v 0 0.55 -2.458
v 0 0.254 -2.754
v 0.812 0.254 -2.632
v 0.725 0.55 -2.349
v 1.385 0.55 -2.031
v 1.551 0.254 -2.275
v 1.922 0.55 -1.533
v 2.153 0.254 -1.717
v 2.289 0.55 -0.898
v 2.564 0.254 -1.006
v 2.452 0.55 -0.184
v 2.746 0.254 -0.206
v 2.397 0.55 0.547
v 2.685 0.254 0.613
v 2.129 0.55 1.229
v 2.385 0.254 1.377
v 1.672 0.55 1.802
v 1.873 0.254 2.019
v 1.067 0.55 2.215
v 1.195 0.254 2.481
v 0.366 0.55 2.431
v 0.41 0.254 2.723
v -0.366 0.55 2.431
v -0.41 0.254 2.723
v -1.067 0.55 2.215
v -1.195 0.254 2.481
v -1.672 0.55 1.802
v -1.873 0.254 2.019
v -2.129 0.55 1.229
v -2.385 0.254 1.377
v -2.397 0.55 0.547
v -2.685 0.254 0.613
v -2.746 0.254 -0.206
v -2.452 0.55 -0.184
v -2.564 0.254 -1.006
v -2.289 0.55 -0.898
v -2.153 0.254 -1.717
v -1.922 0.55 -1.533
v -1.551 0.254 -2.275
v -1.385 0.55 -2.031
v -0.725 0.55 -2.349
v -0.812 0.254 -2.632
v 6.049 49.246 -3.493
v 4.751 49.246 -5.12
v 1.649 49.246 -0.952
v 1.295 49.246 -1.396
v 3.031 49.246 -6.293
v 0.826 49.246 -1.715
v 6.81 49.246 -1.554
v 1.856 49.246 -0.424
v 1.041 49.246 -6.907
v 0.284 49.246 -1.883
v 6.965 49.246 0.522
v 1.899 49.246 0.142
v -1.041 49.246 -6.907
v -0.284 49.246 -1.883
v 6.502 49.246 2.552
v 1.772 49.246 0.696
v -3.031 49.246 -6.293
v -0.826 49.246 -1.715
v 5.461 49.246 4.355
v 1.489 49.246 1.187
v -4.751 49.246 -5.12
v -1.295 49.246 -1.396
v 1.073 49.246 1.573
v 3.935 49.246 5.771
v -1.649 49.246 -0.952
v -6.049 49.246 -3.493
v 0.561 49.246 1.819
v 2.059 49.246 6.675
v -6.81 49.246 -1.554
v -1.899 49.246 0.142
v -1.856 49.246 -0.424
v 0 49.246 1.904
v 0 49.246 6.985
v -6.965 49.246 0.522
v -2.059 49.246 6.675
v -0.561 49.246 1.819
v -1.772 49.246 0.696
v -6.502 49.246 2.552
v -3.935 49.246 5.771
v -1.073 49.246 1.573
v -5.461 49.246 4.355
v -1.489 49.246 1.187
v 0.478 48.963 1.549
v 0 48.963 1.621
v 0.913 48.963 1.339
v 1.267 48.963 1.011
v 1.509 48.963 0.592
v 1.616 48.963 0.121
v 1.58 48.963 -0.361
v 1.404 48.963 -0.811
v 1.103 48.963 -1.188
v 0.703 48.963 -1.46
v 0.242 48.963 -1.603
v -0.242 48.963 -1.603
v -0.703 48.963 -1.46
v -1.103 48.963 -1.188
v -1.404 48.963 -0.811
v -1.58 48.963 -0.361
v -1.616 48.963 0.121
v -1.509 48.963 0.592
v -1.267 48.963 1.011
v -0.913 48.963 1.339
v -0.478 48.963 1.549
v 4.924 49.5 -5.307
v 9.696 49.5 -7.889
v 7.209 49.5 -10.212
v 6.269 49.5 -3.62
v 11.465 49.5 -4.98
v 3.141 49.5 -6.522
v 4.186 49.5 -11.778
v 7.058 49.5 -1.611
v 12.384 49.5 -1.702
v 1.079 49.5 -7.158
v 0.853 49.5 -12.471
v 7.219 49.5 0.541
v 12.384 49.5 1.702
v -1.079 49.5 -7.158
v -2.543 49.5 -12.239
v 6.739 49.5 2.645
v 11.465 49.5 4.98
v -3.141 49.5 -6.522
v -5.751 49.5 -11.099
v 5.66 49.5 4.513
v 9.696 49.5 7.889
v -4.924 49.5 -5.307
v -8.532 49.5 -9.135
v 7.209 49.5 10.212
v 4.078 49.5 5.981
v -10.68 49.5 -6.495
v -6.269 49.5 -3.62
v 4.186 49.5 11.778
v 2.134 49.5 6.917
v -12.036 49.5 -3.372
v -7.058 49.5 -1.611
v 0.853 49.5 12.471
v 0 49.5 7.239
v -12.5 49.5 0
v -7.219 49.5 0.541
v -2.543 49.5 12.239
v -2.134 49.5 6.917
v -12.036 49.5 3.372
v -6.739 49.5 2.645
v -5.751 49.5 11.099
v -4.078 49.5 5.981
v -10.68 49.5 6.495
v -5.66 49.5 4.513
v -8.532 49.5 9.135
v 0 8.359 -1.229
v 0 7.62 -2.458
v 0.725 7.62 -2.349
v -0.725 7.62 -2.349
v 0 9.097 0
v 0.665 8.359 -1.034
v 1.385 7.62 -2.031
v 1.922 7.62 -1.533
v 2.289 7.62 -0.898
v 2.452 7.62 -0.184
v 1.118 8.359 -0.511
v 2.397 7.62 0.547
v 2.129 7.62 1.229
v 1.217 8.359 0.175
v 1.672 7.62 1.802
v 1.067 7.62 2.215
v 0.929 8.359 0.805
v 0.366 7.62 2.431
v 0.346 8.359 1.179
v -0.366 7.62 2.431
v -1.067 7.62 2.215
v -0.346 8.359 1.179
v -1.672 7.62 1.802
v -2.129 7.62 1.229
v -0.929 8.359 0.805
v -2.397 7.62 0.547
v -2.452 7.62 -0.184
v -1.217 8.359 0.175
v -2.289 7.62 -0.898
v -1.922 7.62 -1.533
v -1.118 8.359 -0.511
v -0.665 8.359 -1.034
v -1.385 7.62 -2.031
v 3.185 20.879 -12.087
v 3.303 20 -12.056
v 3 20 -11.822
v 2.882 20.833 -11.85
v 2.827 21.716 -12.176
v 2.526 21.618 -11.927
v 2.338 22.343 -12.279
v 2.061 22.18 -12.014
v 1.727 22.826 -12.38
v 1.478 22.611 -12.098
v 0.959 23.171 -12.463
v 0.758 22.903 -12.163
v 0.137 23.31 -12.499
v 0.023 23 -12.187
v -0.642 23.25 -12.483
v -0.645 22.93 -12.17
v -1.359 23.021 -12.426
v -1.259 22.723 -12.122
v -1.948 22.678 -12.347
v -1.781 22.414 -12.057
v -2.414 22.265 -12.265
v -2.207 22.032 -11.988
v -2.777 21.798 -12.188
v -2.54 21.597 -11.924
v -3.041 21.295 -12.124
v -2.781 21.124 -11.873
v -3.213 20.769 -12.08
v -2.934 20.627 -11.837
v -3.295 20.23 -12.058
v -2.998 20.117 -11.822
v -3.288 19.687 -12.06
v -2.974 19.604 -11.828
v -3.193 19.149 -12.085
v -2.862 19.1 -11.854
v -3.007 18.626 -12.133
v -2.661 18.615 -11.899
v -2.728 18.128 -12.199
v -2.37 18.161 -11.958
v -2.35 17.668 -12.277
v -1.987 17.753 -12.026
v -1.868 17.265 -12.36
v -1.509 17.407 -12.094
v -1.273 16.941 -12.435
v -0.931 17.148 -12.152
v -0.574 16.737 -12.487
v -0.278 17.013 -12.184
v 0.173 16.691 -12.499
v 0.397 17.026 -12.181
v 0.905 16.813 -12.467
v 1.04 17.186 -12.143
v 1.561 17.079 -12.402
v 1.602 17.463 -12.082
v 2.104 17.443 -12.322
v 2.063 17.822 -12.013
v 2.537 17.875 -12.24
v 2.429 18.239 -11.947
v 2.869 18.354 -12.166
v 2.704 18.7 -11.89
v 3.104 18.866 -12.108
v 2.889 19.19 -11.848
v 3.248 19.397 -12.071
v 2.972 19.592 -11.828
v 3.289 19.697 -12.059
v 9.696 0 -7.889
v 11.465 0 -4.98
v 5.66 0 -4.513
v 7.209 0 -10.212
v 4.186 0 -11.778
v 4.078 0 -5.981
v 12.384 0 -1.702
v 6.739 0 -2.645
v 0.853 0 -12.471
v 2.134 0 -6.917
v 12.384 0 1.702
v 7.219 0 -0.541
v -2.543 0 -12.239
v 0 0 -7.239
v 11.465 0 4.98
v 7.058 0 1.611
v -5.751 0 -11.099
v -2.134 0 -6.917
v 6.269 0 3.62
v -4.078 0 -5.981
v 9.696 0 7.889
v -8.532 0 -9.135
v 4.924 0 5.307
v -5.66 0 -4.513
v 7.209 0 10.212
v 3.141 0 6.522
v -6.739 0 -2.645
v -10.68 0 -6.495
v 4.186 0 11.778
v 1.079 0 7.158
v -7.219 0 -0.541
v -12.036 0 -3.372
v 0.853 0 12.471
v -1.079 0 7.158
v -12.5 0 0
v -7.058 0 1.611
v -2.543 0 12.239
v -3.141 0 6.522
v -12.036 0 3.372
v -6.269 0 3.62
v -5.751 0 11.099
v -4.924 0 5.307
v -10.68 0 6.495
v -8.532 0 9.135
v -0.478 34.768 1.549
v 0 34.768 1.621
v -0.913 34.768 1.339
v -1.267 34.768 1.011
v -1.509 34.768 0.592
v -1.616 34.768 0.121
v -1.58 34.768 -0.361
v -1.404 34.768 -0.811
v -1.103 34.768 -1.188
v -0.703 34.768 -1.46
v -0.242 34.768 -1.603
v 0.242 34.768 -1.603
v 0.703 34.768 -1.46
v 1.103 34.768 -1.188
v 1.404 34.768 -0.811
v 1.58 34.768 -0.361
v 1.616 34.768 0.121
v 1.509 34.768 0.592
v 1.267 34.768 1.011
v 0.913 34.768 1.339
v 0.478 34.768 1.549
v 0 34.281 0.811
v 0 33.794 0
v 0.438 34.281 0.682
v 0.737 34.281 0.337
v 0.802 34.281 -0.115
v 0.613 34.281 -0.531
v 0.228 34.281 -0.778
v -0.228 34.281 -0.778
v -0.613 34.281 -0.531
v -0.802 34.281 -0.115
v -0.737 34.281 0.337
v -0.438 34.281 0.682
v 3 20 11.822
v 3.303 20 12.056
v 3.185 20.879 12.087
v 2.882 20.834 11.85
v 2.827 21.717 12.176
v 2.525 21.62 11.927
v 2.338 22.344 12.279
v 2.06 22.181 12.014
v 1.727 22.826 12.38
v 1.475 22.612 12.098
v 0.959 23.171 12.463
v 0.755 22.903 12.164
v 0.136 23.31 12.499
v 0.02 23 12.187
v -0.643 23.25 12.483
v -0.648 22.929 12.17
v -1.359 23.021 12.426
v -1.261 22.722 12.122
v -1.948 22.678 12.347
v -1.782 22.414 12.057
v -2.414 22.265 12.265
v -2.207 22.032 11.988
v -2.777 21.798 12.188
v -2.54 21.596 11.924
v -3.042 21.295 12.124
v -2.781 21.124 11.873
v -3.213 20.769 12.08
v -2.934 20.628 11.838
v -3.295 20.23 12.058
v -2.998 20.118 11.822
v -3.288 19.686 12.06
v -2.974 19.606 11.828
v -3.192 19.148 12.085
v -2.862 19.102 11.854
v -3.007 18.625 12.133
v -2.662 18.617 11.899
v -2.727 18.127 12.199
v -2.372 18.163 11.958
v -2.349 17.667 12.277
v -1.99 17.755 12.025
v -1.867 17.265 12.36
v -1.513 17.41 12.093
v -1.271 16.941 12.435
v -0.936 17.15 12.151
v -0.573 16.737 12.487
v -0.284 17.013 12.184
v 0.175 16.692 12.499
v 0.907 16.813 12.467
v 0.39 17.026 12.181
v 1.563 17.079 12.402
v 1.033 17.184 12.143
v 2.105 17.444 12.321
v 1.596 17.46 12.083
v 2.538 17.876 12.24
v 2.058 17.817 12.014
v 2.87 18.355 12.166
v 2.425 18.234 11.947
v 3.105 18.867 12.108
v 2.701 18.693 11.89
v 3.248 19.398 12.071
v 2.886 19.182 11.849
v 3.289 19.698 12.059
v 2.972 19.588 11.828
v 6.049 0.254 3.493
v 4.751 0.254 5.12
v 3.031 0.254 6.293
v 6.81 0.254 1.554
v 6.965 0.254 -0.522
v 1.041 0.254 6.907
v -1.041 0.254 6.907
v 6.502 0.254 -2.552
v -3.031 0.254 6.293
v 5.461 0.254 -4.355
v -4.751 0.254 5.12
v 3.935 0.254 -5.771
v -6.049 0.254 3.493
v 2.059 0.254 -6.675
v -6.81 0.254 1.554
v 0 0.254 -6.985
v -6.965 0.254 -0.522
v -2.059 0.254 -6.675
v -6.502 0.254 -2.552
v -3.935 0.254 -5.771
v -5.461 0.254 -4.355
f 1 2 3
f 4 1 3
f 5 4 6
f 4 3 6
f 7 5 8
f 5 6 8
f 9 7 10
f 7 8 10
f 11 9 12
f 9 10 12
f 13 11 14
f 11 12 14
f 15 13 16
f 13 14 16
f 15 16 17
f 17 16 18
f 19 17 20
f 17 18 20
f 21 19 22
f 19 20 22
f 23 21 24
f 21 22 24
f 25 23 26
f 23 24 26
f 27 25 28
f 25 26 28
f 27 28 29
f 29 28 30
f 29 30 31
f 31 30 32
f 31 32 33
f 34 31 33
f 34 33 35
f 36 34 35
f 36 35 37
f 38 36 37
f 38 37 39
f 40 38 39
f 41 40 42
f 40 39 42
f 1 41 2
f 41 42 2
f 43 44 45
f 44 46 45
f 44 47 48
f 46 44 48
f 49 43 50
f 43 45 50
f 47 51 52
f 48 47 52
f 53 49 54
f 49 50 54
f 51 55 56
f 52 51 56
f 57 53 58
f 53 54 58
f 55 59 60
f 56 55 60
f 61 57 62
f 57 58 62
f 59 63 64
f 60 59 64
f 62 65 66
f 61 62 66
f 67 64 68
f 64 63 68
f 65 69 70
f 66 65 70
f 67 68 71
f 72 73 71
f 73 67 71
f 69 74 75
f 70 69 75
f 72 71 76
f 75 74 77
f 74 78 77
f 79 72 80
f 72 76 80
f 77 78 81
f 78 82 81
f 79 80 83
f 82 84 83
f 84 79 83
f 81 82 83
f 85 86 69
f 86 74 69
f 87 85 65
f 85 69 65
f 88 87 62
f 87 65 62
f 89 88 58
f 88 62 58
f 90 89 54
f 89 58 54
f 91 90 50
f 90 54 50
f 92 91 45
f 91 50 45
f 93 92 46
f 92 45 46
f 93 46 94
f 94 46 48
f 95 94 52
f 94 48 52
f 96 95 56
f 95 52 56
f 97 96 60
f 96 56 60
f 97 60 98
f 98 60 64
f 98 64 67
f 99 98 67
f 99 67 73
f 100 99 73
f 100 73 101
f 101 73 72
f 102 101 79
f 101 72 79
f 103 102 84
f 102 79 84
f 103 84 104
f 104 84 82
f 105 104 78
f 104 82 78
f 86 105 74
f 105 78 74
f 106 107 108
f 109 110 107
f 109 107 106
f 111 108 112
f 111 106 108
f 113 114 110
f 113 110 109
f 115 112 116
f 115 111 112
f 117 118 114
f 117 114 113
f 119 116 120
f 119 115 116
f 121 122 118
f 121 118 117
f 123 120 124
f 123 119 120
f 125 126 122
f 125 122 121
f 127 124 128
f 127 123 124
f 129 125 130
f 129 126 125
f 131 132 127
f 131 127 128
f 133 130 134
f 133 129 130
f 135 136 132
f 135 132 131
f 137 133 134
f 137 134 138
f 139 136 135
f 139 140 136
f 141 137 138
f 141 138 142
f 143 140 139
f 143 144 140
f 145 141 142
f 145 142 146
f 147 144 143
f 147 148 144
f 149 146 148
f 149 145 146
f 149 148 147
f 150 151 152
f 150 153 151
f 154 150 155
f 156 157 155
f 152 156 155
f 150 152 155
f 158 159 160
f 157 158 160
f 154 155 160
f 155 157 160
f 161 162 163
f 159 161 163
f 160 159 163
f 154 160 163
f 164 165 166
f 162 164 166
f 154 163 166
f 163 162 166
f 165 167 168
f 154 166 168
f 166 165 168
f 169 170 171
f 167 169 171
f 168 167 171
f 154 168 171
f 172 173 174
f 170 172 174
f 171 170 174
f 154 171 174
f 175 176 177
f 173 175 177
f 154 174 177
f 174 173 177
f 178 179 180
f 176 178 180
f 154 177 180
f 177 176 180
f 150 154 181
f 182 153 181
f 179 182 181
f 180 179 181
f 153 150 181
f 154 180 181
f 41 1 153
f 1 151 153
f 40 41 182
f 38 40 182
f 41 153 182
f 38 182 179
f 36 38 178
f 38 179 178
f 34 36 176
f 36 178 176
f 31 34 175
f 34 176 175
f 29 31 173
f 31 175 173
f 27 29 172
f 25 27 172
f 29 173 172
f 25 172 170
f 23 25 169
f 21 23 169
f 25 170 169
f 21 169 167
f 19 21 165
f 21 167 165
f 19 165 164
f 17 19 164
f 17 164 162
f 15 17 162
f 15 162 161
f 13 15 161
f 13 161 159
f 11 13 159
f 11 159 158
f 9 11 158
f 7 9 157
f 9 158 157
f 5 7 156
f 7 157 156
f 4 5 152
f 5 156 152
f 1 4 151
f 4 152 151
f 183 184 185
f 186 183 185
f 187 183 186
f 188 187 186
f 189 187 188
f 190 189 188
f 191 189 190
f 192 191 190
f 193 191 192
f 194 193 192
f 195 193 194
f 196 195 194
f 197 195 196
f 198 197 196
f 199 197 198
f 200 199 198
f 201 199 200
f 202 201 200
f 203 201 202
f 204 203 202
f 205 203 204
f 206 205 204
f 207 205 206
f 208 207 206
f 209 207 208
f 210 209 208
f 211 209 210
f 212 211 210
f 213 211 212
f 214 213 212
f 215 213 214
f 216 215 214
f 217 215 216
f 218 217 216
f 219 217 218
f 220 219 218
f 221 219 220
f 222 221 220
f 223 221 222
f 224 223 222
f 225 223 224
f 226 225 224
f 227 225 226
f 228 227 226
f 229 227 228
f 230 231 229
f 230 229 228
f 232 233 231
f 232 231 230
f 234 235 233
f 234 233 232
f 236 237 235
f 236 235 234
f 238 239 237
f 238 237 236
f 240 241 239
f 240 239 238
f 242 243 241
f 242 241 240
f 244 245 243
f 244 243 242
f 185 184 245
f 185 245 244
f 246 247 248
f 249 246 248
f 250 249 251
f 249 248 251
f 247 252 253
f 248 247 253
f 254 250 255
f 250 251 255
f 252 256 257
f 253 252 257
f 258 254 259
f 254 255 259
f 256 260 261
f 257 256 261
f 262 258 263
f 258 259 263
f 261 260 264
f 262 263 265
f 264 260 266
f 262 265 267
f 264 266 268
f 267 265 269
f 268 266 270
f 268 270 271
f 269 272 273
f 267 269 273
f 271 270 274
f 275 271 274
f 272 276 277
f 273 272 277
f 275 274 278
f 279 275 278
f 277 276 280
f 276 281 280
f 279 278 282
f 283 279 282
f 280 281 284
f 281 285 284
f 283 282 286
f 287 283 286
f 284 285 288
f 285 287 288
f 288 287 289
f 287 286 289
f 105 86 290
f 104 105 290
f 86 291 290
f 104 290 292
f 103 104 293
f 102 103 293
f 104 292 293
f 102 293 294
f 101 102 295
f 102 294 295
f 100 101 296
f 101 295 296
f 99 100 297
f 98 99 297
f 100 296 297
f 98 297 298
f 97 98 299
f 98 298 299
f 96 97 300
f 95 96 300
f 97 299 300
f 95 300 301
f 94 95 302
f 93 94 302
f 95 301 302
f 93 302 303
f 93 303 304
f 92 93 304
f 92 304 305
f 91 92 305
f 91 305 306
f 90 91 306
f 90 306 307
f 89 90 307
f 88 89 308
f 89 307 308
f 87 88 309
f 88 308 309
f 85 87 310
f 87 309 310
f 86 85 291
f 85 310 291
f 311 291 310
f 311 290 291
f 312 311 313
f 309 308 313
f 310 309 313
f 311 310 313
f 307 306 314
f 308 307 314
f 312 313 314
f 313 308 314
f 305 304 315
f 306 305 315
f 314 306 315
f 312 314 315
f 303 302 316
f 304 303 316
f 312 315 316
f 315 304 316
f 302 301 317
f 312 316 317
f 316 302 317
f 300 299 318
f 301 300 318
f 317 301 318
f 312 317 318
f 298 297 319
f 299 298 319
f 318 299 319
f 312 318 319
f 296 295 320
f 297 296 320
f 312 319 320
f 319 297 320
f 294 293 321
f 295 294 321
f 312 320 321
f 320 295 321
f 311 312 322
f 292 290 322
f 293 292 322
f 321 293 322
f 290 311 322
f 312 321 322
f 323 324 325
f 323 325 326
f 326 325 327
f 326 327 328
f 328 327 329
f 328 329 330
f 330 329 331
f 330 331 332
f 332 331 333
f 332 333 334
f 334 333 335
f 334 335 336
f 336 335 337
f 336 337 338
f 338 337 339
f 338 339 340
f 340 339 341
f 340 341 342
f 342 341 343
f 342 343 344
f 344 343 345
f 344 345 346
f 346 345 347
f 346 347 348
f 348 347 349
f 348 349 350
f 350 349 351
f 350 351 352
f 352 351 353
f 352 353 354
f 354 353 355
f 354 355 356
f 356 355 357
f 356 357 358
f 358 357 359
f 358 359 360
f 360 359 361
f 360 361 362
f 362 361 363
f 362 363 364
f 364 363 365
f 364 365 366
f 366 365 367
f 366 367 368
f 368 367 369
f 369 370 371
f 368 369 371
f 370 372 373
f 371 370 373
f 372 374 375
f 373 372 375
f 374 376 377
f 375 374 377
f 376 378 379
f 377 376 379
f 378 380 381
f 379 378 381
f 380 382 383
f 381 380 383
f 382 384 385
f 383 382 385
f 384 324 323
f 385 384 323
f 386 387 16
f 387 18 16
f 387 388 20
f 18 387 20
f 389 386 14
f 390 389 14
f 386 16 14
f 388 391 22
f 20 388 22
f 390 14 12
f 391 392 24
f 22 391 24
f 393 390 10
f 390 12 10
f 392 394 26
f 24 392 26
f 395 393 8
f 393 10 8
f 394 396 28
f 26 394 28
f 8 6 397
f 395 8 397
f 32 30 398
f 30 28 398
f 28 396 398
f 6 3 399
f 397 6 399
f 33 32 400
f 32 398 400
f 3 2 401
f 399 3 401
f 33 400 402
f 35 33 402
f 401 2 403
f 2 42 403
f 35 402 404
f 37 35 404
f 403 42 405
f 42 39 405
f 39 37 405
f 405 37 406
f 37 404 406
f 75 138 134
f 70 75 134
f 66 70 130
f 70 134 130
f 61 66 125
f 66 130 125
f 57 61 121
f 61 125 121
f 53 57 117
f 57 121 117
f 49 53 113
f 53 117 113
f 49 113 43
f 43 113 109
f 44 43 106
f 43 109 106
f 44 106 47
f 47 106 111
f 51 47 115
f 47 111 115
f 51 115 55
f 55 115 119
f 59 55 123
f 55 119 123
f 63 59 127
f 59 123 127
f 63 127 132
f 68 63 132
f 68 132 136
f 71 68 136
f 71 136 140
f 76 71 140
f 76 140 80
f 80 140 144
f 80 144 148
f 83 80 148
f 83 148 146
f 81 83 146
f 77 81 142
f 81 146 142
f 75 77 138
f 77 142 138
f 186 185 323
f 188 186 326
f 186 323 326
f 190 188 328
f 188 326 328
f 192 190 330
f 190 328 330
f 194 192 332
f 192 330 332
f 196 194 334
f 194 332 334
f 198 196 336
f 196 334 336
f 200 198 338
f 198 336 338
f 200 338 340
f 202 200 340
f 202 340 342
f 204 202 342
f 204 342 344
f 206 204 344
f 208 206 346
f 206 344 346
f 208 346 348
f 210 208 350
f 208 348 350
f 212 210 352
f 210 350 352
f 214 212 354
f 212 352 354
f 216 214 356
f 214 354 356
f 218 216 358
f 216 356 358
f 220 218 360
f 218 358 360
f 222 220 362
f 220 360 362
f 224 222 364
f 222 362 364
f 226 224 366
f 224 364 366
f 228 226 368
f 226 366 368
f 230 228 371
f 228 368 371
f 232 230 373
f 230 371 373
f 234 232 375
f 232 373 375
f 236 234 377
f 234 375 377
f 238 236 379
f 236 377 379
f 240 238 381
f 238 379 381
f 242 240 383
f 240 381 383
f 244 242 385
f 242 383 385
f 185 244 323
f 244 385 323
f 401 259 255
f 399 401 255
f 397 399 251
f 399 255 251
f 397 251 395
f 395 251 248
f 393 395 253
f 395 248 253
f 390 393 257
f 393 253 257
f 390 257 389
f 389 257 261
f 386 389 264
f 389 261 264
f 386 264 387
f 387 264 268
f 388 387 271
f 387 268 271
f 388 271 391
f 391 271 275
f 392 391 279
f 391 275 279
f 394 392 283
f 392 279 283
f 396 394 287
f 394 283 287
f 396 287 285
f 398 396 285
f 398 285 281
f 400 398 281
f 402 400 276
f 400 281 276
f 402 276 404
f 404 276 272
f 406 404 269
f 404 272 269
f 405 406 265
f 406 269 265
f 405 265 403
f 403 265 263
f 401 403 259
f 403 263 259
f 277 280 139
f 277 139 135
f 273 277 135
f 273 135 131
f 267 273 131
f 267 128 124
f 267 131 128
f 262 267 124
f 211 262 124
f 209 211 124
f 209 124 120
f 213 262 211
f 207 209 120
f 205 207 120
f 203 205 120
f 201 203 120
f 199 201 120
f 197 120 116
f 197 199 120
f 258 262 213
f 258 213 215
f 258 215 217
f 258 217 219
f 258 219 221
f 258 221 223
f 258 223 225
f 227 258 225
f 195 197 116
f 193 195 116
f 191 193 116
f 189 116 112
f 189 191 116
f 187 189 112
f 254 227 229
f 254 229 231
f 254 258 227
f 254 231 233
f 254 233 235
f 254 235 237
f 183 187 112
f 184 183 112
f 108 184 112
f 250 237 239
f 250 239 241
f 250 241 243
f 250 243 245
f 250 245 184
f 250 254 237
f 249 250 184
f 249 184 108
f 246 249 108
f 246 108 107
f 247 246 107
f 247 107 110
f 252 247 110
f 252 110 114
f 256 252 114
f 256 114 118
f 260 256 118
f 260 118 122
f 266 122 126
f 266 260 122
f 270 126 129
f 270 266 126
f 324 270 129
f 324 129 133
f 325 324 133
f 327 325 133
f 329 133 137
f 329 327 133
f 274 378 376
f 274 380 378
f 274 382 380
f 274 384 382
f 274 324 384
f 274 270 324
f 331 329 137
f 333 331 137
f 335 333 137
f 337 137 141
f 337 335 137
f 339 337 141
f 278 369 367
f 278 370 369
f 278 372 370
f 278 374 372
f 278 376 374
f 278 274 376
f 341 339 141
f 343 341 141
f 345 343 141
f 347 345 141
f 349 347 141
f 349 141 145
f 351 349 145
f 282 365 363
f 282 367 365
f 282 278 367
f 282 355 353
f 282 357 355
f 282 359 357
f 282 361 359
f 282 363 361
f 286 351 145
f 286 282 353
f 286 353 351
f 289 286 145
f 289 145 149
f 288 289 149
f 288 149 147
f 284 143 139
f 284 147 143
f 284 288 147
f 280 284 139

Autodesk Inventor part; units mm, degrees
ref_plane "YZ Plane" through (0, 0, 0) normal (1, 0, 0) x (0, 1, 0)
ref_plane "XZ Plane" through (0, 0, 0) normal (0, 1, 0) x (-1, 0, 0)
ref_plane "XY Plane" through (0, 0, 0) normal (0, 0, 1) x (1, 0, 0)
sketch "Sketch1" plane through (0, 0, 0) normal (0, 1, 0) x (-1, 0, 0)
  circle A0 centre (0, 0) radius 12.5
  dimension "d0" = 25
extrude "Extrusion1" add sketch "Sketch1" along normal blind 49.5
hole "ReliefTop" at (0, 49.5, 0) direction (0, -1, 0) diameter 13.97 depth 0.254 countersink diameter 14.478 countersink angle 90
hole "ReliefBottom" at (0, 0, 0) direction (0, 1, 0) diameter 13.97 depth 0.254 countersink diameter 14.478 countersink angle 90
hole "MountBottomM6" at (0, 0.254, 0) direction (0, 1, 0) diameter 4.917 depth 7.366 tip angle 118 countersink diameter 5.508 countersink angle 90 thread size "M6x1" class "6H" standard "ISO Metric profile"
hole "MountTopM4" at (0, 49.246, 0) direction (0, -1, 0) diameter 3.242 depth 14.478 tip angle 118 countersink diameter 3.808 countersink angle 90 thread size "M4x0.7" class "6H" standard "ISO Metric profile"
sketch "Sketch2" plane through (0, 0, 0) normal (0, 0, 1) x (1, 0, 0)
  circle A0 centre (0, 20) radius 3
  line L0 (-12.5, 0) -> (12.5, 0) projected
  line L1 (0, -4.6) -> (0, 27.6) projected
  point P0 (0, 0)
  dimension "d49" = 6
  dimension "d50" = 20
extrude "Extrusion2" cut sketch "Sketch2" along normal through all both and the other way through all
chamfer "Chamfer1" distance 0.313 angle 45 2 edges at (-3, 19.9998, 12.1347) (-3, 19.9998, -12.1347)
equation "\"d1\" = height"
equation "\"d5\" = reliefMinor"
equation "\"d7\" = reliefMajor"
equation "\"d10\" = reliefDepth"
equation "\"d14\" = reliefMinor"
equation "\"d16\" = reliefMajor"
equation "\"d19\" = reliefDepth"
equation "\"d25\" = chamferM6"
equation "\"d28\" = depthM6"
equation "\"d40\" = chamferM4"
equation "\"d43\" = depthM4"
equation "\"reliefDepth\" = 0.254"
equation "\"reliefMinor\" = 13.97"
equation "\"reliefMajor\" = 14.478"
equation "\"chamferM6\" = 5.508"
equation "\"chamferM4\" = 3.808"
equation "\"depthM6\" = 7.366"
equation "\"depthM4\" = 14.478"
equation "\"height\" = 49.5"
properties part number "PLS-P642H0495A00_M" material "Stainless Steel"
